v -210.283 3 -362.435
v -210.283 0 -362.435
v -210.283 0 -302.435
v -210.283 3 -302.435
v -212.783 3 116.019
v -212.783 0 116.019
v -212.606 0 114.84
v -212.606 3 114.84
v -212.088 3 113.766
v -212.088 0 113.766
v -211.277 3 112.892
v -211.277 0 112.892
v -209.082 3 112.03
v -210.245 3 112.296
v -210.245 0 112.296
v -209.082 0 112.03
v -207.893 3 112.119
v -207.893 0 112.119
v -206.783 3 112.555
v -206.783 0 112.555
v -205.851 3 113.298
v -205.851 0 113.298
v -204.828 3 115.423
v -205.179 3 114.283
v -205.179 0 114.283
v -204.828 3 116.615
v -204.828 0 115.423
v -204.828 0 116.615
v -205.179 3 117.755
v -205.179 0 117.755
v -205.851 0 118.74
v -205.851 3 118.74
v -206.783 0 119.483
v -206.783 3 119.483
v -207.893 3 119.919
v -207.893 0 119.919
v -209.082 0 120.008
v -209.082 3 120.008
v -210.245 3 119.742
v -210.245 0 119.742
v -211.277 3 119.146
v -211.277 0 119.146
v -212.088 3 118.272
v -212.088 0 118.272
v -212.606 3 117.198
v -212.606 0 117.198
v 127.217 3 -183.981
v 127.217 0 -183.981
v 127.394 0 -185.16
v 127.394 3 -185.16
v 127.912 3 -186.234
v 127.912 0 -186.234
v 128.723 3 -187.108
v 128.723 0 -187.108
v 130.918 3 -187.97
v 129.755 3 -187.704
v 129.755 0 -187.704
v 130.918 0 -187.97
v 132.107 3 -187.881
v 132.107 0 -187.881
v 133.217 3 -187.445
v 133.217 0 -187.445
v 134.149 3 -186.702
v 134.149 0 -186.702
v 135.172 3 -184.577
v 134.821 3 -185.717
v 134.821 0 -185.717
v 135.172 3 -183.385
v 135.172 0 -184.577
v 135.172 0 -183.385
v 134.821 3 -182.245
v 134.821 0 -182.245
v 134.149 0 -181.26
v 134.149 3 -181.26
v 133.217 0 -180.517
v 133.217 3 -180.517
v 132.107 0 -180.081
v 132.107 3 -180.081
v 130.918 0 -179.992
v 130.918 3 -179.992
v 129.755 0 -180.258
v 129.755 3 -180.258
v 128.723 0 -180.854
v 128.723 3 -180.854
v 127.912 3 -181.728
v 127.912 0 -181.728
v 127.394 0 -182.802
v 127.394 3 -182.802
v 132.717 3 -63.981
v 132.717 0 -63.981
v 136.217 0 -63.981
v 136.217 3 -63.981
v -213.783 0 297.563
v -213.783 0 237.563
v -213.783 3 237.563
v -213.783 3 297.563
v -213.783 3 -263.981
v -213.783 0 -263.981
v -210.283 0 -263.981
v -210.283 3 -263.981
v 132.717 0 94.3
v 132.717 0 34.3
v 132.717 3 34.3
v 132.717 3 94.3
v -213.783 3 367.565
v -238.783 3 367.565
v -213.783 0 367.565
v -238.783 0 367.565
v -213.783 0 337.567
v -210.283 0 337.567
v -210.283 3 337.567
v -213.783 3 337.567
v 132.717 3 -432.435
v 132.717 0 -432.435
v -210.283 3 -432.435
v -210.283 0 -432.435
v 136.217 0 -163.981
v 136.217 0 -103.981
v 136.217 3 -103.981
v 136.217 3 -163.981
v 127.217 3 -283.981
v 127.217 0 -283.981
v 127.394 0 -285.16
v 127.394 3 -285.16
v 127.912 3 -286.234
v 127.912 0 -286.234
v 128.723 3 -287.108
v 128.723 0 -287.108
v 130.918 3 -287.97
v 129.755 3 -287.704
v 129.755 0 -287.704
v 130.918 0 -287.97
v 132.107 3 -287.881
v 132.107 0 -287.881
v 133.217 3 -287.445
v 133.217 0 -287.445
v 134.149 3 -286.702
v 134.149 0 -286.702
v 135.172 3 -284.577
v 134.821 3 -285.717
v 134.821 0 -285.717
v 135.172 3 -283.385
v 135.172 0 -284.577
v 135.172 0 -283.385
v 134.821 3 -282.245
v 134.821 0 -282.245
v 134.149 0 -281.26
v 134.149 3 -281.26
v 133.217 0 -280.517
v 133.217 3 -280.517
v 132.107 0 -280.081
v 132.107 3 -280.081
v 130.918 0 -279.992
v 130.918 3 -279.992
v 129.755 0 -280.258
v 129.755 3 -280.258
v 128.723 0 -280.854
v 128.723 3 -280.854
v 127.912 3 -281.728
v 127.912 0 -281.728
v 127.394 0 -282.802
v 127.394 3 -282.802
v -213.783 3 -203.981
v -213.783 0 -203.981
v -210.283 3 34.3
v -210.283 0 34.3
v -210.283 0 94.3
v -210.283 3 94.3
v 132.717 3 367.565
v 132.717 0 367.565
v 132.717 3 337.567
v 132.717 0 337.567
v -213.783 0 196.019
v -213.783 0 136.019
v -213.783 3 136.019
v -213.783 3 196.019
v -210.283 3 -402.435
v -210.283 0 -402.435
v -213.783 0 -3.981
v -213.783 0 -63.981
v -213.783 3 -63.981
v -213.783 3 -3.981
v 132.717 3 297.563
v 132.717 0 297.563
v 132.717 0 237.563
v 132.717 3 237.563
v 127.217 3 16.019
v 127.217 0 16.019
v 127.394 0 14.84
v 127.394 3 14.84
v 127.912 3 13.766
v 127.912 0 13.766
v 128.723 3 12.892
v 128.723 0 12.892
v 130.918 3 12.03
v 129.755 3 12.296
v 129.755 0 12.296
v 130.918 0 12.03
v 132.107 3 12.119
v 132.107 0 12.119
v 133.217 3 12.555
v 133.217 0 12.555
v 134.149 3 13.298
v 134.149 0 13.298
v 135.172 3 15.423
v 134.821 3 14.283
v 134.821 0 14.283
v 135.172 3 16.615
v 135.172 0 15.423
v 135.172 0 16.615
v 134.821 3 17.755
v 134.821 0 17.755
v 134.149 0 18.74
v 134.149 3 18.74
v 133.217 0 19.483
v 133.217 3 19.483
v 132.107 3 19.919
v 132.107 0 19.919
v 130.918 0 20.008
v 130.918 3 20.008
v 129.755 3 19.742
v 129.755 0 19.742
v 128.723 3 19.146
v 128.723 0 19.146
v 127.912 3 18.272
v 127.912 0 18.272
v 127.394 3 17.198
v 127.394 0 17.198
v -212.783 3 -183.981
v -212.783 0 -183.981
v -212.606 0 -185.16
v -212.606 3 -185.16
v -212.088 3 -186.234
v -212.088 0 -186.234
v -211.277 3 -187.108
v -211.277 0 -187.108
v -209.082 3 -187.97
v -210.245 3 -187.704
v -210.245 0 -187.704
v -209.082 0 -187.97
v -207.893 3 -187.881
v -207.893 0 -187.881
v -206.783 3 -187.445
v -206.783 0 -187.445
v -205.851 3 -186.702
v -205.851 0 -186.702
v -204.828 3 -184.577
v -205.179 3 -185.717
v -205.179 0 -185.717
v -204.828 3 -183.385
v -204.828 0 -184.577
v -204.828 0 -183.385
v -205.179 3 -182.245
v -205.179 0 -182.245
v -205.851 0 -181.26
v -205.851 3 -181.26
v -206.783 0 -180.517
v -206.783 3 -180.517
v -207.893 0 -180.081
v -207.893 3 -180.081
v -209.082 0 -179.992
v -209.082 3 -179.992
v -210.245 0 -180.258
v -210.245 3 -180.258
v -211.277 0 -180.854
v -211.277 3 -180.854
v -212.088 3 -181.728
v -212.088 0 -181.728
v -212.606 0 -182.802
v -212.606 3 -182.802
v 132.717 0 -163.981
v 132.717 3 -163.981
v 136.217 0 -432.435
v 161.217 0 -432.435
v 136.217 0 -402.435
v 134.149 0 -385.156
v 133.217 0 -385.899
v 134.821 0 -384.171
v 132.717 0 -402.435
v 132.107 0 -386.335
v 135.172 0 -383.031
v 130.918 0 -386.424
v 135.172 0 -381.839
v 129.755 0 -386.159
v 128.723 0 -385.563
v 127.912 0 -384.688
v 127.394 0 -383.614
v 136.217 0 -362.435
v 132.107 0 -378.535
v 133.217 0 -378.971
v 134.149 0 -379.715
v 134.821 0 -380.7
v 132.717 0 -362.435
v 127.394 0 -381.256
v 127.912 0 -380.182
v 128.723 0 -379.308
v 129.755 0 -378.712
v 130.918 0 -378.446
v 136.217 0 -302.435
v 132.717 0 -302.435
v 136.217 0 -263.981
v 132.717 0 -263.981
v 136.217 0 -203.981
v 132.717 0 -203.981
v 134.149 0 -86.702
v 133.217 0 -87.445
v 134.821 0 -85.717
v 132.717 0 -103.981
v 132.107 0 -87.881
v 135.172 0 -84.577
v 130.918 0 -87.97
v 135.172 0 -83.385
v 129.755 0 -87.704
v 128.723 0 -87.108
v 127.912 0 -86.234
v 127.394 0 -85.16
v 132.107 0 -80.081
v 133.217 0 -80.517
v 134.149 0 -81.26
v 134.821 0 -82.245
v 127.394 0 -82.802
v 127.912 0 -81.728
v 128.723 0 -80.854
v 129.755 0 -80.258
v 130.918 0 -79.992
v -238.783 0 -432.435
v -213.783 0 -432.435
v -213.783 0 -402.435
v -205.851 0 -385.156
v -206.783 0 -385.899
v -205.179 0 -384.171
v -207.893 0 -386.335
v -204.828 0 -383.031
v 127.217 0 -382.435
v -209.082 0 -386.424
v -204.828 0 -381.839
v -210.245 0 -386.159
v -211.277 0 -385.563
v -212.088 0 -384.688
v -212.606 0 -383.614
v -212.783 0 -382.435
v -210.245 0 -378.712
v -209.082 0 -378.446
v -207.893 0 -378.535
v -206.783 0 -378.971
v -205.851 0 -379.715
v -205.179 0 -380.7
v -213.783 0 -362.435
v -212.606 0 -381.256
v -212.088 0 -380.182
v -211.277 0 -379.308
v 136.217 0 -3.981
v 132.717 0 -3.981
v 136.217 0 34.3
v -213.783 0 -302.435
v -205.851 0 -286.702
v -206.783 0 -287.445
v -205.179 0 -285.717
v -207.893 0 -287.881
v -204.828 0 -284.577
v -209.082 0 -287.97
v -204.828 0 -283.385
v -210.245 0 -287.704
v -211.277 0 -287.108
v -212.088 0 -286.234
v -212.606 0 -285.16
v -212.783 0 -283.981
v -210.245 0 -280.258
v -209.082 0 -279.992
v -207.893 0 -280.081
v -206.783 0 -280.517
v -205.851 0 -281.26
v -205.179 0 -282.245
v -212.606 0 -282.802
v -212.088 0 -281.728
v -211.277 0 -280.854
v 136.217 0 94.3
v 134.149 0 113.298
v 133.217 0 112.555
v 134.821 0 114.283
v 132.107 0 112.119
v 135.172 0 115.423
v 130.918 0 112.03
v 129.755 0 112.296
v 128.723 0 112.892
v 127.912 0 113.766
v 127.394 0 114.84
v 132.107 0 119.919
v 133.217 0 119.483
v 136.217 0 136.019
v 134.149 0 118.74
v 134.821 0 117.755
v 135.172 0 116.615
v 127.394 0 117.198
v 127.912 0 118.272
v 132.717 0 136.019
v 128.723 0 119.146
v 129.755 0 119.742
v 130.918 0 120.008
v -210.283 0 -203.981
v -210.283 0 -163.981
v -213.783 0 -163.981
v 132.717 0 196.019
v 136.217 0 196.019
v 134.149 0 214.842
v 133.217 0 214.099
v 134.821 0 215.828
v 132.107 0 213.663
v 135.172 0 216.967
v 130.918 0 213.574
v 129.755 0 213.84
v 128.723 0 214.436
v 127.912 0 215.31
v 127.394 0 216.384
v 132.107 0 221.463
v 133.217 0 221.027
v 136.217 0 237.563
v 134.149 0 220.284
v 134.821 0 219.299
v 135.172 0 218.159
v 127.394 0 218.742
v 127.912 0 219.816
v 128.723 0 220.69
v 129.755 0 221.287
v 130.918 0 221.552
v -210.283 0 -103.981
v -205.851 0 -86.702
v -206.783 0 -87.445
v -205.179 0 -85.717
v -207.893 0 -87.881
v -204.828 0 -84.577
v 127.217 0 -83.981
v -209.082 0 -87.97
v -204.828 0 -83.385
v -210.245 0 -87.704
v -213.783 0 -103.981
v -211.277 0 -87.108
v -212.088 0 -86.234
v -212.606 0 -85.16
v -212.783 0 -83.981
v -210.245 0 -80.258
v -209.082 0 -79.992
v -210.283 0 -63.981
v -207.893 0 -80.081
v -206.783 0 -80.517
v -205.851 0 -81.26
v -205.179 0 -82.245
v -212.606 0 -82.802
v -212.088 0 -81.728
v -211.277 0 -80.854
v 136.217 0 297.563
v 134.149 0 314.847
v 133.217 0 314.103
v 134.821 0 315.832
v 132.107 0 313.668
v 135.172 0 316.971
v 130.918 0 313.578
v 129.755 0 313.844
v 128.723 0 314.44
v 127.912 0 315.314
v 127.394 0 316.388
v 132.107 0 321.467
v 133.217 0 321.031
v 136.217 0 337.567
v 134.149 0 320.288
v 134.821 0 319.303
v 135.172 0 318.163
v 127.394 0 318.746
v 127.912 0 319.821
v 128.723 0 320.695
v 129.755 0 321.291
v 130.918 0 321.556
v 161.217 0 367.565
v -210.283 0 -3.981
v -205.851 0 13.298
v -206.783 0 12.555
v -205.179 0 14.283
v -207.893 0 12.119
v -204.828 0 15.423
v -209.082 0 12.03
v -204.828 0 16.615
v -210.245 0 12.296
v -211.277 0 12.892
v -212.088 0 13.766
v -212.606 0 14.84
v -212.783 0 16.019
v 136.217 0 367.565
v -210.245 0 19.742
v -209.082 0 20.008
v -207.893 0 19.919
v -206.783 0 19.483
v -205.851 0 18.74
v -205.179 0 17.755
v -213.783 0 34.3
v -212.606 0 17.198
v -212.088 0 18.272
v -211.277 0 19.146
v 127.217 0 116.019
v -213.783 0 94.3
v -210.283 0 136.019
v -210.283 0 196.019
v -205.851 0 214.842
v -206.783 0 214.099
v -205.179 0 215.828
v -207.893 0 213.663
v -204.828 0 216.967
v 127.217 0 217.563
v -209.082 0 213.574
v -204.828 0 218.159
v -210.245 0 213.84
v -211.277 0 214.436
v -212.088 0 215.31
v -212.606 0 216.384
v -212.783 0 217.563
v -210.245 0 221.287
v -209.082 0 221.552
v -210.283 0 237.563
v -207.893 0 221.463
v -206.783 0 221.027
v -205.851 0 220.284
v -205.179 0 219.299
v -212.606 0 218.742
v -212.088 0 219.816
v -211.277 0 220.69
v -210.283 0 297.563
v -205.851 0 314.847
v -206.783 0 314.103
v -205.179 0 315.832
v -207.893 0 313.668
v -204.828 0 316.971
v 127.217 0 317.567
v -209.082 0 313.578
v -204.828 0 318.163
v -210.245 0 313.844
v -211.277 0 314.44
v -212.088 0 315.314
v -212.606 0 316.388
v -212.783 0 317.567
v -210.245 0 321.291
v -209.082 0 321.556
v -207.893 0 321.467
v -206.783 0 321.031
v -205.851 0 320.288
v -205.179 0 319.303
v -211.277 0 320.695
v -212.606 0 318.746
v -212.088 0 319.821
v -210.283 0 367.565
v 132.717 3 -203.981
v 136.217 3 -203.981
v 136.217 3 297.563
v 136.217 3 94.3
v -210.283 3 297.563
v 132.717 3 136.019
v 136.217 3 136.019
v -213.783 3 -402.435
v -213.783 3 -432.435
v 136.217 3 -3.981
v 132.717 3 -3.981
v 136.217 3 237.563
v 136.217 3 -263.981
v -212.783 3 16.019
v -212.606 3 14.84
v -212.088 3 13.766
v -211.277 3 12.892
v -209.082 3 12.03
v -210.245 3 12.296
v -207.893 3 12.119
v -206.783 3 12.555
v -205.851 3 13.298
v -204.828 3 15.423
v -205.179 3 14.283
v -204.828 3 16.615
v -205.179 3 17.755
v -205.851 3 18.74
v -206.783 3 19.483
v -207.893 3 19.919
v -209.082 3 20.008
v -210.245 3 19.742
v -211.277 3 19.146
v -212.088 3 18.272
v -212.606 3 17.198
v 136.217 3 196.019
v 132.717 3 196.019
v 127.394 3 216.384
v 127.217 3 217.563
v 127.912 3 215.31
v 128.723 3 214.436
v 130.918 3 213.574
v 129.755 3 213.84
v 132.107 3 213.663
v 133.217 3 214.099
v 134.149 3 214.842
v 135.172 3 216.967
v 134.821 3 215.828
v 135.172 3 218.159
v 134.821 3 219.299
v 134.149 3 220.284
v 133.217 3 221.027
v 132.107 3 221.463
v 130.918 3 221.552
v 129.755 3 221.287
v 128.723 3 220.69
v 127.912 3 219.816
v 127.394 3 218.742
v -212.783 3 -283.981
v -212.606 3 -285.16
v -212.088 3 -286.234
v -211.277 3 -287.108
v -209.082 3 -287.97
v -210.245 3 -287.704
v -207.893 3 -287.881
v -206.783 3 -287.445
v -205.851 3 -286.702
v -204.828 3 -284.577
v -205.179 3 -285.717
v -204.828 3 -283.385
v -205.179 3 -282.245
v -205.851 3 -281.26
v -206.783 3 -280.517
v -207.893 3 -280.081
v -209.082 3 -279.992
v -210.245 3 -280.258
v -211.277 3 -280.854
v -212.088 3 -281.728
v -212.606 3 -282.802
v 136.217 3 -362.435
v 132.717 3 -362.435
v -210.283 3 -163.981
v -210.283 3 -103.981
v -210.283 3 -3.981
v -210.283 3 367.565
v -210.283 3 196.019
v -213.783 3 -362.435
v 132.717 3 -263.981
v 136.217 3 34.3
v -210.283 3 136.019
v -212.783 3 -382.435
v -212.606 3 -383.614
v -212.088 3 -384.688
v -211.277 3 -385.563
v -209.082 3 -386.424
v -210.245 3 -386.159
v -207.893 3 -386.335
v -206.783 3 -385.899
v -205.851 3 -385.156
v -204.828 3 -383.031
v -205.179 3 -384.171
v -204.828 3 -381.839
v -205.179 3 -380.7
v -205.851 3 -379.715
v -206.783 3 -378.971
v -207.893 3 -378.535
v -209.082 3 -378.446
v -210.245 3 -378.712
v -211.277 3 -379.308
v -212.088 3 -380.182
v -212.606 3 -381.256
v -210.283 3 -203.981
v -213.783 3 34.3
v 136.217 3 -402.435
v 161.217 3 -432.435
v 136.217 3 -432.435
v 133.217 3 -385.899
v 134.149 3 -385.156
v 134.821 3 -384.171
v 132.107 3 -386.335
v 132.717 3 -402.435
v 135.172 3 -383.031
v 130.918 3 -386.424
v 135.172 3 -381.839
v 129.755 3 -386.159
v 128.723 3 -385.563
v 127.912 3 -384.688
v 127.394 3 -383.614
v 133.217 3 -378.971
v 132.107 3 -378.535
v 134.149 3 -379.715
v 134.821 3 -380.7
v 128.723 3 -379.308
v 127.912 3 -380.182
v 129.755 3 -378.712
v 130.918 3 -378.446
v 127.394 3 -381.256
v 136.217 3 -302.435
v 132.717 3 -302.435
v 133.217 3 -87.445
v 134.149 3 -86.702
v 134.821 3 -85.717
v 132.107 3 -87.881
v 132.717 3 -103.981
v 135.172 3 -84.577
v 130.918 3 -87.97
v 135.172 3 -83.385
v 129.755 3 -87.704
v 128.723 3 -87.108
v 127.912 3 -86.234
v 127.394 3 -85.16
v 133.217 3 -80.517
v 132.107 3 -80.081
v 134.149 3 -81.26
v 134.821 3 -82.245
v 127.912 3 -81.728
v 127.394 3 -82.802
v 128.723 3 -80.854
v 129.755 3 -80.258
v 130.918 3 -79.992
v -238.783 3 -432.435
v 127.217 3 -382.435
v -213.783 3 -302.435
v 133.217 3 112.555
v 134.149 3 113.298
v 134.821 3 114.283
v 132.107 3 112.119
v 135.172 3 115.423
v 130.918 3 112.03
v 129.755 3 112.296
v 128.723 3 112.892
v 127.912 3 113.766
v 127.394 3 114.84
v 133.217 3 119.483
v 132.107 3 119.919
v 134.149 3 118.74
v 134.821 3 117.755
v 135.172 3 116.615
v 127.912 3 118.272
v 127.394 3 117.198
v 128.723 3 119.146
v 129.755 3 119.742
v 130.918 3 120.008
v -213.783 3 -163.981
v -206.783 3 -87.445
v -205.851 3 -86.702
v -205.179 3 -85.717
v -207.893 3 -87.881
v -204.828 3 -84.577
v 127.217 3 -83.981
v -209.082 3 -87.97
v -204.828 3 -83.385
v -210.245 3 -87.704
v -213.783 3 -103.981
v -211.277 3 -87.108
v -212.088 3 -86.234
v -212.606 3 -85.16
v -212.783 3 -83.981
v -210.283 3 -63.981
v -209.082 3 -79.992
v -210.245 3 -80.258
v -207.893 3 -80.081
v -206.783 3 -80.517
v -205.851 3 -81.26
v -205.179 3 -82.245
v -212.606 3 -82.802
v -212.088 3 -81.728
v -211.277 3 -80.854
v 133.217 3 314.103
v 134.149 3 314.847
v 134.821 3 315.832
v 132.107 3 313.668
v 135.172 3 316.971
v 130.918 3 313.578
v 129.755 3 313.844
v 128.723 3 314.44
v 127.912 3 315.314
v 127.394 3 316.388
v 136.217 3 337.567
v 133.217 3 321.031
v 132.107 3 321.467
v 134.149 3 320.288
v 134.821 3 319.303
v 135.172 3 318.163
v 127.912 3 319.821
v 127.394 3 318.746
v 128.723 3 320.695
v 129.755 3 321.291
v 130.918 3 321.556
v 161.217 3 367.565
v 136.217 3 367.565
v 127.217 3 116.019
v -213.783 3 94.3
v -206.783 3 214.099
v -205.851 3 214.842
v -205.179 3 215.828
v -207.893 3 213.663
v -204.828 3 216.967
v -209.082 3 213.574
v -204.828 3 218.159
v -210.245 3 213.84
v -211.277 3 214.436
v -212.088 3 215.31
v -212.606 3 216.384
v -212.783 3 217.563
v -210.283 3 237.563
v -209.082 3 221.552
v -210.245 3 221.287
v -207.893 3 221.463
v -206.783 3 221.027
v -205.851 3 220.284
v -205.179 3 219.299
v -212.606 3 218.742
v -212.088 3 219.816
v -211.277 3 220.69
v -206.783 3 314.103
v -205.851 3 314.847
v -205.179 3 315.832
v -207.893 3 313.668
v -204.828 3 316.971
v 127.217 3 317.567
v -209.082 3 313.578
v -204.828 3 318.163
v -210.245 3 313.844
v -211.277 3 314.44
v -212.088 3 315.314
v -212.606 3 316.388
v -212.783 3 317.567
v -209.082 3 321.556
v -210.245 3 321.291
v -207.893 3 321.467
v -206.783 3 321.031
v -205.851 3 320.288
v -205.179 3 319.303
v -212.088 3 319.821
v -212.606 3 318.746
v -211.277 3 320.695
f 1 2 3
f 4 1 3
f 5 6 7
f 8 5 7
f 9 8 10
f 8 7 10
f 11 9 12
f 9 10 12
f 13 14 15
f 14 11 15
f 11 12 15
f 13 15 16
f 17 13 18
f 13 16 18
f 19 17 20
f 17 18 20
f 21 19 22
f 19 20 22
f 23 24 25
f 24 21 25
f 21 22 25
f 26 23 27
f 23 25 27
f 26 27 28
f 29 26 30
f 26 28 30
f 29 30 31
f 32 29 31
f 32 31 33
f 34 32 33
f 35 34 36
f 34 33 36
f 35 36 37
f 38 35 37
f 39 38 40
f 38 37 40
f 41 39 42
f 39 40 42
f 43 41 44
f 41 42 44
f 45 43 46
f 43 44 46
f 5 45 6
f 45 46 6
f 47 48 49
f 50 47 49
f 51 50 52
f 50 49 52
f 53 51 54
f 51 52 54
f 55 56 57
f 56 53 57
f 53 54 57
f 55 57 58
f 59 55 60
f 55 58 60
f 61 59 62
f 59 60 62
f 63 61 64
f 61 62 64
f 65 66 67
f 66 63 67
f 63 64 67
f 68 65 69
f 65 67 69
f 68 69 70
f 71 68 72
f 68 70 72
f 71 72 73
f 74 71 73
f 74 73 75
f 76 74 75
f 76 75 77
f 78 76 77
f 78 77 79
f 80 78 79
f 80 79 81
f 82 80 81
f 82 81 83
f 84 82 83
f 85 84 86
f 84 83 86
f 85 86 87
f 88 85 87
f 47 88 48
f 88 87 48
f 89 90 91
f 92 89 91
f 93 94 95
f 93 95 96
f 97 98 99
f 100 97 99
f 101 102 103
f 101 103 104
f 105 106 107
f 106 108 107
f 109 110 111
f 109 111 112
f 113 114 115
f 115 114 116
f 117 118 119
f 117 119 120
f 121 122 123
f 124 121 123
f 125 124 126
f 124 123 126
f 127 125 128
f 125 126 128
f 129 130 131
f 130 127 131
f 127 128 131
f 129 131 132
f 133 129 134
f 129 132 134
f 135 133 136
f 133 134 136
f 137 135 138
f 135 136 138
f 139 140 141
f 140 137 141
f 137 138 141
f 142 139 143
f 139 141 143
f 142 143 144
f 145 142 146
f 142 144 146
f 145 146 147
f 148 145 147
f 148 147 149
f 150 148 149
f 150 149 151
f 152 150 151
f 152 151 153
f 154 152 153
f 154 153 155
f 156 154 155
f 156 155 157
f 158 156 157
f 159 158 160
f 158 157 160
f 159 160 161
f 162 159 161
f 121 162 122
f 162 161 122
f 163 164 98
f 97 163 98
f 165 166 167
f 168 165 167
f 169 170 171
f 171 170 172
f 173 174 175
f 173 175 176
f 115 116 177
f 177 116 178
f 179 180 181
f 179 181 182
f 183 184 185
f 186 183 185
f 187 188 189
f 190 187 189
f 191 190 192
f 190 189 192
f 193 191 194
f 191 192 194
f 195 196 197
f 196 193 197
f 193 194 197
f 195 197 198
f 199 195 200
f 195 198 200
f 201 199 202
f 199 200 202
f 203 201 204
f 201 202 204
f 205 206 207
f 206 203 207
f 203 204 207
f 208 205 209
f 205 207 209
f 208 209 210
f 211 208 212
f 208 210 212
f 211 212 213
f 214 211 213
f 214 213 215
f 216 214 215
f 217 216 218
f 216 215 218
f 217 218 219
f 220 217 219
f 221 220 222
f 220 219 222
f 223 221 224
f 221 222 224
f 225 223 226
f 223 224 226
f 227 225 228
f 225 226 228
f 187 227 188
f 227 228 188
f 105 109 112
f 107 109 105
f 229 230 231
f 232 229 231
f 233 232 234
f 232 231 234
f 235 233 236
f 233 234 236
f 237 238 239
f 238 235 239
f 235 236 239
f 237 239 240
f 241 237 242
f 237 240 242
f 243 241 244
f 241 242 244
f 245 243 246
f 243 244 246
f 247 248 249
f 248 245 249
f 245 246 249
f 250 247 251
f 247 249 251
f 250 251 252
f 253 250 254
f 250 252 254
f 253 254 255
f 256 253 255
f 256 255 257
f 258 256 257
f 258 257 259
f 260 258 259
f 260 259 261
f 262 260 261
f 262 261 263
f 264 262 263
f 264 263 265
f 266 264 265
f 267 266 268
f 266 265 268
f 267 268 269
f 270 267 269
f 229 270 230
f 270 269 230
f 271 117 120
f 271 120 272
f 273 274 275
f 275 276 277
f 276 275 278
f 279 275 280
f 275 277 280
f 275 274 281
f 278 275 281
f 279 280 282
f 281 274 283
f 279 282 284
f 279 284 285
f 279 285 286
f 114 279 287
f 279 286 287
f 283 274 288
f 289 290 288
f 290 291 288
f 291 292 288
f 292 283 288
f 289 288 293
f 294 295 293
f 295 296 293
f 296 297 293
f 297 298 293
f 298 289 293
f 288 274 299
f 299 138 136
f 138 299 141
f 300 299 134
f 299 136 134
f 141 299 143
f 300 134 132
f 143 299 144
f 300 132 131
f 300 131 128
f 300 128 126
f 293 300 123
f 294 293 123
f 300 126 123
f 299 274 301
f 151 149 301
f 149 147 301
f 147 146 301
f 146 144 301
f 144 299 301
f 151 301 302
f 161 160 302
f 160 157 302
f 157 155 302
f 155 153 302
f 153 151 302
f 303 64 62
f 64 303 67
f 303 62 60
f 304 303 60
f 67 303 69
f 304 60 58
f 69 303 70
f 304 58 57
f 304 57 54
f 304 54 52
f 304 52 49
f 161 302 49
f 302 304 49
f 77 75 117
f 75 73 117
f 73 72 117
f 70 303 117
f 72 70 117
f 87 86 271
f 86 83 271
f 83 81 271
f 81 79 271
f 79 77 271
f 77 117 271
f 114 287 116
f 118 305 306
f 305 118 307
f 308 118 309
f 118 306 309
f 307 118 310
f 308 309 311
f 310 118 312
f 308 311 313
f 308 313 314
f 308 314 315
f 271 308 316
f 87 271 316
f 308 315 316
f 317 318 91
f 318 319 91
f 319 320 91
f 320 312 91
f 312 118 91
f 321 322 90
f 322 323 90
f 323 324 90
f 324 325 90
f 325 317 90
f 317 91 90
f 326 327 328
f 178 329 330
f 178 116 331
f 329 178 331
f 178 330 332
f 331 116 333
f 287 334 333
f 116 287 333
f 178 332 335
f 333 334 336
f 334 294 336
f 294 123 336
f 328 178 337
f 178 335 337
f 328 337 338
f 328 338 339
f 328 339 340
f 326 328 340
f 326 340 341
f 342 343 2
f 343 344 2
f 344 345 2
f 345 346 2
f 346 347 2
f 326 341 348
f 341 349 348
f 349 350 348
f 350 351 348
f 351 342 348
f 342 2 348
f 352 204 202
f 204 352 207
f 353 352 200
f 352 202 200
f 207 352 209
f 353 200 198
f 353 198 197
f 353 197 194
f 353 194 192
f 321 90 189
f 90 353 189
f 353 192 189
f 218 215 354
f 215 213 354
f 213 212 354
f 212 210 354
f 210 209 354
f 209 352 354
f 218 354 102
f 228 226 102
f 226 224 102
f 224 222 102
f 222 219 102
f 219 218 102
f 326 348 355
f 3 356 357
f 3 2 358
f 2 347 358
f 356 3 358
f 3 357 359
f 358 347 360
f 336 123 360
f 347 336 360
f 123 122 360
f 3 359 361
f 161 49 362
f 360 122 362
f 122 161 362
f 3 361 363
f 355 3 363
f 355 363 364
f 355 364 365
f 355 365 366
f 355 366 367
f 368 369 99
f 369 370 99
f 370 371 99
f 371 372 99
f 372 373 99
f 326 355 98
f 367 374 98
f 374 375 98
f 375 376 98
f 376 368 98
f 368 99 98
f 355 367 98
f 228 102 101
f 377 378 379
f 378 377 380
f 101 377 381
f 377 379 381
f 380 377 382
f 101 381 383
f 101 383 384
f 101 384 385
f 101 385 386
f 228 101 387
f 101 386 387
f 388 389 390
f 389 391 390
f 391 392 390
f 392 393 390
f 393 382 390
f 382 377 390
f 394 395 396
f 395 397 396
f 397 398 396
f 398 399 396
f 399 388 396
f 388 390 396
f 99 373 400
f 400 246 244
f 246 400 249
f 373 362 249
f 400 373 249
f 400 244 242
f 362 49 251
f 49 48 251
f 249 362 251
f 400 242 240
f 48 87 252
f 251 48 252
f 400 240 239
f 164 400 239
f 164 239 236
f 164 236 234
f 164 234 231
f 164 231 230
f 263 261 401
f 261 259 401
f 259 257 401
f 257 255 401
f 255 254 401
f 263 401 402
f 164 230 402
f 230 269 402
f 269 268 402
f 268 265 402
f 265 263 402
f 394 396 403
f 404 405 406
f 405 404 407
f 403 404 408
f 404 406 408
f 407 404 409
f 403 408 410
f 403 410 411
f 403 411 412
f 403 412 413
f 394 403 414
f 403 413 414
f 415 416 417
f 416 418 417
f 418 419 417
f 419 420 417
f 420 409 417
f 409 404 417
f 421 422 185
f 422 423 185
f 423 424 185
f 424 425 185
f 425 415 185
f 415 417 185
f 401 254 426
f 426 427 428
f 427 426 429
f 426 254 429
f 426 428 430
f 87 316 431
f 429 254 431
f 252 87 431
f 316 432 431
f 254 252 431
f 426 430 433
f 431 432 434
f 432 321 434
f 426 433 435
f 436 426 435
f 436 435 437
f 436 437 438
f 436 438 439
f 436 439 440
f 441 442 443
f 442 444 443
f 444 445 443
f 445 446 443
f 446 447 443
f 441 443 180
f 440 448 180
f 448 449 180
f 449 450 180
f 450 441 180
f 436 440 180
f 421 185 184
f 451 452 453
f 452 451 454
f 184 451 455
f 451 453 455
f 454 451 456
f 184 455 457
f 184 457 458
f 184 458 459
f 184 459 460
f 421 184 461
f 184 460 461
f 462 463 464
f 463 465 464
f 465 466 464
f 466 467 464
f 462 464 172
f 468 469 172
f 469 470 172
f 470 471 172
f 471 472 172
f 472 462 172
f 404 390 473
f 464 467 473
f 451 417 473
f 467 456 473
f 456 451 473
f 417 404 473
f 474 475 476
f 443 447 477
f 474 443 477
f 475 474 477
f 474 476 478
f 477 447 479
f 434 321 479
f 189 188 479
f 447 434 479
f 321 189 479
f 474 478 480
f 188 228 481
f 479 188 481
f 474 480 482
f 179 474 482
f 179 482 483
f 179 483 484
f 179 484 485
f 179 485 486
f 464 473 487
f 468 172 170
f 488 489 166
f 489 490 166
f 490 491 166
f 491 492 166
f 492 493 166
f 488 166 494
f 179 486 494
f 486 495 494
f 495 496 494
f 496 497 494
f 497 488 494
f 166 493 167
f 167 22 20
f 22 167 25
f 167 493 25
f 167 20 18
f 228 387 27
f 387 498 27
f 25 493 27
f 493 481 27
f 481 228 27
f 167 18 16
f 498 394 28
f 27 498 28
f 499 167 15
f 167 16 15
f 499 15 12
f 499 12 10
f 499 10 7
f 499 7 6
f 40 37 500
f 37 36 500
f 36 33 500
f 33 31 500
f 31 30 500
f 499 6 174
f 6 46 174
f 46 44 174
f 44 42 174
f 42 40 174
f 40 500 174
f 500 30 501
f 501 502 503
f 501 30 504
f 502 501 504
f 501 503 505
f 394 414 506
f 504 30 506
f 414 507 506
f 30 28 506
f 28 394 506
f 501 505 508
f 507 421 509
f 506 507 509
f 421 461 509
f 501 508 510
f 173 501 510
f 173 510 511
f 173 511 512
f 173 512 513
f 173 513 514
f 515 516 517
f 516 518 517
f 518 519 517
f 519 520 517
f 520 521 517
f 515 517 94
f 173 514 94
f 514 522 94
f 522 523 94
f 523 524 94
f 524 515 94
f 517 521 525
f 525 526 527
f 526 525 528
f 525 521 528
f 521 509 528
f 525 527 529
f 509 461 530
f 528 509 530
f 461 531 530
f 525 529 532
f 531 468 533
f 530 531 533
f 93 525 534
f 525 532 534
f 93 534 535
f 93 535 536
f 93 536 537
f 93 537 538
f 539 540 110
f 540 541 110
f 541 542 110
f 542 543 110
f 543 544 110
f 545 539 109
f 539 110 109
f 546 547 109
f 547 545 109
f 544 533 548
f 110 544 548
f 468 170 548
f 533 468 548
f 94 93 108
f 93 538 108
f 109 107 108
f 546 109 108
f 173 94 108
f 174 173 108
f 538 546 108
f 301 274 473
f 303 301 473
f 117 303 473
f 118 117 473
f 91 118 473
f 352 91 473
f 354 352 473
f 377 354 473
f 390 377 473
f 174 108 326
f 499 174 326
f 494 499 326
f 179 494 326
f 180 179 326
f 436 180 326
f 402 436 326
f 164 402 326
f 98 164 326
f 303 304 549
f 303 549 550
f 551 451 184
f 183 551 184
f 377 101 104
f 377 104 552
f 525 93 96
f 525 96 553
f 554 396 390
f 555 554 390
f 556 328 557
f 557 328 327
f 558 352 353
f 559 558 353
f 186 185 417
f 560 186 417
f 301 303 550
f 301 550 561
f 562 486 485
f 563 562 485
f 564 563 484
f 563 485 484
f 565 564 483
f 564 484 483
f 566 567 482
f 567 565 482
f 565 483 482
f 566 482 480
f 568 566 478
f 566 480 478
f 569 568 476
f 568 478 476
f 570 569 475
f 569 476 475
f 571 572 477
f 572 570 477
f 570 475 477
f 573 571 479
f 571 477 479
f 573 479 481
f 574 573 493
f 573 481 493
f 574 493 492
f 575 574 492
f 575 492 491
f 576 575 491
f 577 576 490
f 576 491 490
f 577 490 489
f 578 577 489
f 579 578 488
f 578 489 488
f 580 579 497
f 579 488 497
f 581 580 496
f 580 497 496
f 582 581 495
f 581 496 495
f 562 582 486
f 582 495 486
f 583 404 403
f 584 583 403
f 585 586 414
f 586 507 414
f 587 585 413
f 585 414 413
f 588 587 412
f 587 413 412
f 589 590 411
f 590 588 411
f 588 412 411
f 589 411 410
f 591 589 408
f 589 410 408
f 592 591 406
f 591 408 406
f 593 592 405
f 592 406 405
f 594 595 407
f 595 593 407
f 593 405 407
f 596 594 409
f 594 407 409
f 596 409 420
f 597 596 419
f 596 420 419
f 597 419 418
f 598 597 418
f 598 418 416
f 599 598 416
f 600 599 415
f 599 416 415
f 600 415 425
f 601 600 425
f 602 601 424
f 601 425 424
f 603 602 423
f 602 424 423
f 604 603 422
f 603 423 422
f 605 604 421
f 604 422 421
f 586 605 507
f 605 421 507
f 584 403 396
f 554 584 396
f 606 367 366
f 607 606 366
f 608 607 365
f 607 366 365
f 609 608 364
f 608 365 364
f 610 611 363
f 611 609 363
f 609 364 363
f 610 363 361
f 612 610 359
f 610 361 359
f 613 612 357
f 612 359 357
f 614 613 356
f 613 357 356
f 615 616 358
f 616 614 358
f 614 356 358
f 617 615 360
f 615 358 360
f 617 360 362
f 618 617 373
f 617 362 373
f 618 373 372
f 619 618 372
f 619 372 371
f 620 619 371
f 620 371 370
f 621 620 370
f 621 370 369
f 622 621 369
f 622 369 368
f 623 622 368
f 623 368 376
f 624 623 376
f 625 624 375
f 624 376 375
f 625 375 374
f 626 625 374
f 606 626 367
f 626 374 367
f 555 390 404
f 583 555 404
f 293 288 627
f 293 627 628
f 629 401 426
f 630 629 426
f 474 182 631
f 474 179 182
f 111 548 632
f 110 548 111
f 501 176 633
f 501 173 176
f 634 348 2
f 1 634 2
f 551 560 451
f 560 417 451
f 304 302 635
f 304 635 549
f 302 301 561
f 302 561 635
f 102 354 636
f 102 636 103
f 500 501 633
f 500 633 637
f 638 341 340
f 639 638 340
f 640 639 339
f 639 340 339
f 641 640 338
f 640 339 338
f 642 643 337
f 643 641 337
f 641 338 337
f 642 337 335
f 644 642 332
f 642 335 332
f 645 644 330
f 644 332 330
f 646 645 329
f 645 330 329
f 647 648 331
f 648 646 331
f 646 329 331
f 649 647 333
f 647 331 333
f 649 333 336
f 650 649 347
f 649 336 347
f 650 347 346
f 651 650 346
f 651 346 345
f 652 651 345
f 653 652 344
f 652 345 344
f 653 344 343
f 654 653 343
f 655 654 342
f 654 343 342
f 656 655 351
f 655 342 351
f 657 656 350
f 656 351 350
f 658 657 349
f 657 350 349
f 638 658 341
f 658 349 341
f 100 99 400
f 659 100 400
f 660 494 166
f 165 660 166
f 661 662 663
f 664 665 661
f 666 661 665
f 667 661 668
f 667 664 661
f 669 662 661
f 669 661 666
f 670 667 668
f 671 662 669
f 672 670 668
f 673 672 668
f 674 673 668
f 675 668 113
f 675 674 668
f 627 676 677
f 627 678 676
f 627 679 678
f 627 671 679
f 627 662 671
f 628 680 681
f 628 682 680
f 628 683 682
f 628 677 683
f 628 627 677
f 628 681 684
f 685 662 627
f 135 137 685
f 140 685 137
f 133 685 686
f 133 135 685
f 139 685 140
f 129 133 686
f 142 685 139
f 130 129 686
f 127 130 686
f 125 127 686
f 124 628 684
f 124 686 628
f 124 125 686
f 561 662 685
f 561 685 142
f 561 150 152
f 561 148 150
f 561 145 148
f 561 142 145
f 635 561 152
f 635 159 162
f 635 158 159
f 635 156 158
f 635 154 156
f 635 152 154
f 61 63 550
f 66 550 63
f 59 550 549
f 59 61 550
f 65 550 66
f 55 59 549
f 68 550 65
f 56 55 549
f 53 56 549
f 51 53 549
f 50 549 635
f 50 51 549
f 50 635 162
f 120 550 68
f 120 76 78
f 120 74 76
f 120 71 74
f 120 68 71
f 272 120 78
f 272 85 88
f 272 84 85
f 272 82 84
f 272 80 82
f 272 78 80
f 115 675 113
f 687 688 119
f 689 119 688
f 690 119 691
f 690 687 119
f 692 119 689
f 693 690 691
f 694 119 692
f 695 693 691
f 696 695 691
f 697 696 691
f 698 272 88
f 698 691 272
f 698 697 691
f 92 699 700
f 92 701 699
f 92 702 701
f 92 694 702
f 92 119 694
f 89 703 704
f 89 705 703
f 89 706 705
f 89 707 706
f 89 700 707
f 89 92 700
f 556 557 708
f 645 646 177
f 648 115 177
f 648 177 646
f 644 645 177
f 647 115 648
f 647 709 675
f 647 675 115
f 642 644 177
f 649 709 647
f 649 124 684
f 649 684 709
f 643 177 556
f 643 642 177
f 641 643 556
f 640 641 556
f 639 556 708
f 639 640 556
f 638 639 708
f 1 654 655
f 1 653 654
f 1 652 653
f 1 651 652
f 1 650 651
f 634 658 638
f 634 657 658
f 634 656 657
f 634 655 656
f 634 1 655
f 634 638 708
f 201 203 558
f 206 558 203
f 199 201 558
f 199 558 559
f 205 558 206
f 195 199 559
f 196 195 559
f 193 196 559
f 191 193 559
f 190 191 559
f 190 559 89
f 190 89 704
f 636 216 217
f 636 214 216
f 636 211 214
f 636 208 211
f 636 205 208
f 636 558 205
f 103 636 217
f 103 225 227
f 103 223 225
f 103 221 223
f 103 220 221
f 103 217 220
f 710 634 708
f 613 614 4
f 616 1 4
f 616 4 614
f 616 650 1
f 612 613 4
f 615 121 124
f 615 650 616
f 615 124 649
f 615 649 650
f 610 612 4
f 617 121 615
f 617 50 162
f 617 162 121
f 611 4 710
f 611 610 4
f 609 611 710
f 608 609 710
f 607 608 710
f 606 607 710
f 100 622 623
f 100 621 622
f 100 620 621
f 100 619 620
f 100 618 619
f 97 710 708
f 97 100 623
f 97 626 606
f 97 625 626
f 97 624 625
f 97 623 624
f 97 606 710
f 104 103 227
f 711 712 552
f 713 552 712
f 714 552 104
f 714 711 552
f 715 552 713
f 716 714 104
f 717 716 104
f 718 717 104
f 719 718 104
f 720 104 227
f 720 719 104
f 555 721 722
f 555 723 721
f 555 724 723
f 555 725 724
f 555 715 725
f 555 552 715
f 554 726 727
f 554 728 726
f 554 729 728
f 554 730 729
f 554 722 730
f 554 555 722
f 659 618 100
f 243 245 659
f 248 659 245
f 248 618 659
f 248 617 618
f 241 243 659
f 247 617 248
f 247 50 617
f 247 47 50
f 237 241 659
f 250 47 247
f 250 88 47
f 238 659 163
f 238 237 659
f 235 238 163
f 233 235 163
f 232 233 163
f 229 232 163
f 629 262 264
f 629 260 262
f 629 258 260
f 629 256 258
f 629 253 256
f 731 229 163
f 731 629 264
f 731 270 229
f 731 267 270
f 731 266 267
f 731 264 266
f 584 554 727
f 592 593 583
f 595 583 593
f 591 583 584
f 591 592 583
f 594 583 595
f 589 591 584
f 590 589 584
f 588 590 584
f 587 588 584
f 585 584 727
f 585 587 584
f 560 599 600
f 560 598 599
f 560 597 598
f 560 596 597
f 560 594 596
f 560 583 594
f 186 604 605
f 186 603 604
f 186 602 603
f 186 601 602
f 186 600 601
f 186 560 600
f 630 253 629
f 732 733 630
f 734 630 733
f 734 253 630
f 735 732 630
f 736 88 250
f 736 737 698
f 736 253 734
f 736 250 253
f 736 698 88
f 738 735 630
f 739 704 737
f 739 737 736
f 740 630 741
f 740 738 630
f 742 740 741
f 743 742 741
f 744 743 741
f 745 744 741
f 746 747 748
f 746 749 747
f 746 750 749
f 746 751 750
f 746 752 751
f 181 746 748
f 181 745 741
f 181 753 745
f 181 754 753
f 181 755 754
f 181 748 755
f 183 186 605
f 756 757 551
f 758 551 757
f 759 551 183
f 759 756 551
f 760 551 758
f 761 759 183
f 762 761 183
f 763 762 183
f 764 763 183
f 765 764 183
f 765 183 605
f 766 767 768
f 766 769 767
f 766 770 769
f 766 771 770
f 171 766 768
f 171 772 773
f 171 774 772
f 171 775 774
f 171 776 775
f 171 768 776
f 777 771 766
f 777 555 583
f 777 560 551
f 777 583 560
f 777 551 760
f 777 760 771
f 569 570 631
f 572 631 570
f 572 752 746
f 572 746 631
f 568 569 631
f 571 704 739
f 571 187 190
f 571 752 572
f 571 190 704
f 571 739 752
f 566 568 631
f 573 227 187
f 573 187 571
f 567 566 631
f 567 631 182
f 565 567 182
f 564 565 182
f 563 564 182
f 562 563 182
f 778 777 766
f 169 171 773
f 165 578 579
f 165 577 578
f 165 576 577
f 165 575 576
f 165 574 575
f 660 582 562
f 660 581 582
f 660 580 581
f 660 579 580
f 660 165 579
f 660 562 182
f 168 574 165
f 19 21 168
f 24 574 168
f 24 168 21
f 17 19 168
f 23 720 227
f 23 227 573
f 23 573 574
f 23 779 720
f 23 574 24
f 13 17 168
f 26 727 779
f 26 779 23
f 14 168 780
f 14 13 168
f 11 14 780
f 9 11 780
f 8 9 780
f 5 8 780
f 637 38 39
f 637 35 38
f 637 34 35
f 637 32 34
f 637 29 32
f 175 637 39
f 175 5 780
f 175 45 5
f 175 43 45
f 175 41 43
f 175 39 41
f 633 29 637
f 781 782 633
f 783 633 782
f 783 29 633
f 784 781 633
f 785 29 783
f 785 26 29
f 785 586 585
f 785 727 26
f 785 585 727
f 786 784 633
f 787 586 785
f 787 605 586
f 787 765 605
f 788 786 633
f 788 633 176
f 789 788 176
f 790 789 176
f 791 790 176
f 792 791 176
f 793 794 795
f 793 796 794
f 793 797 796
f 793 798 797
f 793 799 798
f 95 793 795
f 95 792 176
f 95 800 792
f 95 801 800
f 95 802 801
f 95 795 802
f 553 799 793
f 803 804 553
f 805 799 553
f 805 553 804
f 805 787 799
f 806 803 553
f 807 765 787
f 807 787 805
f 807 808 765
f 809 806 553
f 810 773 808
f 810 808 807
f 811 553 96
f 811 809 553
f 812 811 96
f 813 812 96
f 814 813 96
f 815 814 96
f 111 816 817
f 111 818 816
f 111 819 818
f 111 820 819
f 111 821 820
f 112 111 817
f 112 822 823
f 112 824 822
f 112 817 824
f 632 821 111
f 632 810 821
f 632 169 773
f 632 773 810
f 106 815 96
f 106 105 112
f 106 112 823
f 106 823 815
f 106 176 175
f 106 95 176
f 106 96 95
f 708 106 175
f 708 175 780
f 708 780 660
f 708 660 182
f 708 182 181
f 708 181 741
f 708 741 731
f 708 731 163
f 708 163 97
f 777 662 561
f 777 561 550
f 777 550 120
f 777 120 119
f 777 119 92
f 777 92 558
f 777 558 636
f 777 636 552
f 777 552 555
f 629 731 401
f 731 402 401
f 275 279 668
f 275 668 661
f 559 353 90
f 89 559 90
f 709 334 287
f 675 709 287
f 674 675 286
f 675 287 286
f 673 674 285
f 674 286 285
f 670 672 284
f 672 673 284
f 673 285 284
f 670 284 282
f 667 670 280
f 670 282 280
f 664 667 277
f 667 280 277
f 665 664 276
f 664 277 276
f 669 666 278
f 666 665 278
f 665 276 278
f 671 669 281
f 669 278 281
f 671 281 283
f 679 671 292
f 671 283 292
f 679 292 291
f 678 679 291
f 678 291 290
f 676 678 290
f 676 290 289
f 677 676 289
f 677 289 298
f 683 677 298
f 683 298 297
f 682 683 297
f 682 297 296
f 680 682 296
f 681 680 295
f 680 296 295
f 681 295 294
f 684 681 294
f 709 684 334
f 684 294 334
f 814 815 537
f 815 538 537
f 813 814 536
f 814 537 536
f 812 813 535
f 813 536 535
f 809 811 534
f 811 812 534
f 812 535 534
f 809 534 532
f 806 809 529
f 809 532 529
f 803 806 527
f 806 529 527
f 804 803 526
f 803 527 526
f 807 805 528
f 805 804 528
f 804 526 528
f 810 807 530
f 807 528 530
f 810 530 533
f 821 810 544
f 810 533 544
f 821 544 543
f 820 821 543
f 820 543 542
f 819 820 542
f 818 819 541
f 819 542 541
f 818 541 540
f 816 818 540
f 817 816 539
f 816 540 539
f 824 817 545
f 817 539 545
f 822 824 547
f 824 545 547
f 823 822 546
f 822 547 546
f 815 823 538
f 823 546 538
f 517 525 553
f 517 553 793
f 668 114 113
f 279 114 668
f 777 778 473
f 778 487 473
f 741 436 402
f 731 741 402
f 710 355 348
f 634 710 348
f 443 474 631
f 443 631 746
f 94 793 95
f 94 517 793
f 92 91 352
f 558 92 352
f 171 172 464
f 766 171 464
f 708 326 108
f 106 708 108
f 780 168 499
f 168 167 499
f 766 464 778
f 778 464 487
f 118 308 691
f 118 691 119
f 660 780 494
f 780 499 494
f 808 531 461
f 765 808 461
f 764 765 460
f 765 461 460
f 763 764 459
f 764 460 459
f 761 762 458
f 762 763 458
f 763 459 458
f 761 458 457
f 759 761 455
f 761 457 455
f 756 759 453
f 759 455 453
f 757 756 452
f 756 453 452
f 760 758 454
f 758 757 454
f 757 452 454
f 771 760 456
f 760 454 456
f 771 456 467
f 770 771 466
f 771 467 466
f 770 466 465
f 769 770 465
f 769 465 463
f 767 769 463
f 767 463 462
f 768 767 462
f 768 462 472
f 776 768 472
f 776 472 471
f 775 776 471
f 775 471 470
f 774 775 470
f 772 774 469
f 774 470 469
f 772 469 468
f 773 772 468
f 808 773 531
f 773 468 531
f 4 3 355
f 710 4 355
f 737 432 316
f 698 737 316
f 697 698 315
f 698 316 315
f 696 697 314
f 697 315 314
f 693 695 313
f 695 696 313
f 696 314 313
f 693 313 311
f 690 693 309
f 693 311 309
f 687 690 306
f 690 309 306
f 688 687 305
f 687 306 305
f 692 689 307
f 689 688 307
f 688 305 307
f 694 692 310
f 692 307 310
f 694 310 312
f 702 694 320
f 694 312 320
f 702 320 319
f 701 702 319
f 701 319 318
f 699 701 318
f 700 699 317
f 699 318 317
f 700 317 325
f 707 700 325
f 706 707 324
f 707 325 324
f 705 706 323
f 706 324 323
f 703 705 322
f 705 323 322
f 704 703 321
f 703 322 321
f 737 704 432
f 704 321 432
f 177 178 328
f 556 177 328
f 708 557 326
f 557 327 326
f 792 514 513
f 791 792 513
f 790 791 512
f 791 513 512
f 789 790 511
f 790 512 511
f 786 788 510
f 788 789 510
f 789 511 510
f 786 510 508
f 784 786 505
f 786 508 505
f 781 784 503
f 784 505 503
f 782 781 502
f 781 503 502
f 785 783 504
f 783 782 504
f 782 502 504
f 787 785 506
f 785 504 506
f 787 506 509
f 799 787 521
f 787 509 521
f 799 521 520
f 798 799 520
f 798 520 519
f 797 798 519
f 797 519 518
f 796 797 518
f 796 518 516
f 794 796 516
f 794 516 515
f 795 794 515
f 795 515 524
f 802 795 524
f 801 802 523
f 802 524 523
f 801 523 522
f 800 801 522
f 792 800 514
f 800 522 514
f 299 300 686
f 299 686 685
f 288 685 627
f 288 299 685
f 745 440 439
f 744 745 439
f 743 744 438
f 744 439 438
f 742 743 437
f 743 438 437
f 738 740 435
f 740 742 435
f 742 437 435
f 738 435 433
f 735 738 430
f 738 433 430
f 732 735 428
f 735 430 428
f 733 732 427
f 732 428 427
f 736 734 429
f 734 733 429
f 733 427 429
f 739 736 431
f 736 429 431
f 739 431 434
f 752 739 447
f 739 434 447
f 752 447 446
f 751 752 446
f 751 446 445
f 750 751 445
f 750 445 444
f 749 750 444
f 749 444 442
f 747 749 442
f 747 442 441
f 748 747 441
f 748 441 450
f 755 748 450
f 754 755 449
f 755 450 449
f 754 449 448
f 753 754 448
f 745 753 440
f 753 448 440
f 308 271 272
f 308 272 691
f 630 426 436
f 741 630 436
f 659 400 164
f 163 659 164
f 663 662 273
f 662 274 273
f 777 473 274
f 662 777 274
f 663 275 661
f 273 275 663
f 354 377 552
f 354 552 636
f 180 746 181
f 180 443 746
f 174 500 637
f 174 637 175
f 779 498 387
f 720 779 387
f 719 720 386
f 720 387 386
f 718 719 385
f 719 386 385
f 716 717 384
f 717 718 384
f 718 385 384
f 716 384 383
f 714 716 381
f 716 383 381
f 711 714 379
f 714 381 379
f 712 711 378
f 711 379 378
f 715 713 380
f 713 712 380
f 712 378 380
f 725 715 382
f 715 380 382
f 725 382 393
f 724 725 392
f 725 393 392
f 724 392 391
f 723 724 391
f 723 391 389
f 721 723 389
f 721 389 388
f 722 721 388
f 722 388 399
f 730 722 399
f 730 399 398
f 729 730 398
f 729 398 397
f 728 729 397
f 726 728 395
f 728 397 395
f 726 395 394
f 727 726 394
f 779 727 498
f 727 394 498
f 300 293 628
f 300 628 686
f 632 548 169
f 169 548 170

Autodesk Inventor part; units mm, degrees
ref_plane "YZ Plane" through (0, 0, 0) normal (1, 0, 0) x (0, 1, 0)
ref_plane "XZ Plane" through (0, 0, 0) normal (0, 1, 0) x (-1, 0, 0)
ref_plane "XY Plane" through (0, 0, 0) normal (0, 0, 1) x (1, 0, 0)
sketch "Sketch2" plane through (0, 0, 0) normal (0, 1, 0) x (-1, 0, 0)
  line L0 (238.7833, 367.5648) -> (-161.2167, 367.5648)
  line L1 (-161.2167, 367.5648) -> (-161.2167, -432.4352)
  line L2 (-161.2167, -432.4352) -> (238.7833, -432.4352)
  line L3 (238.7833, -432.4352) -> (238.7833, 367.5648)
  circle A0 centre (208.7833, 217.5631) radius 4
  circle A1 centre (208.7833, 317.5673) radius 4
  circle A2 centre (208.7833, -382.4352) radius 4
  circle A3 centre (208.7833, -283.981) radius 4
  circle A4 centre (208.7833, -183.981) radius 4
  circle A5 centre (208.7833, -83.981) radius 4
  circle A6 centre (208.7833, 16.019) radius 4
  circle A7 centre (208.7833, 116.019) radius 4
  line L4 (38.7833, -432.4352) -> (38.7833, 367.5648) construction
  line L5 (208.7833, 217.5631) -> (208.7833, 317.5673) construction
  line L6 (208.7833, 317.5673) -> (208.7833, 367.5648) construction
  line L7 (208.7833, -382.4352) -> (208.7833, -432.4352) construction
  line L8 (208.7833, -382.4352) -> (208.7833, 217.5631) construction
  line L9 (213.7833, -263.981) -> (210.2833, -263.981)
  line L10 (210.2833, -263.981) -> (210.2833, -203.981)
  line L11 (210.2833, -203.981) -> (213.7833, -203.981)
  line L12 (213.7833, -203.981) -> (213.7833, -263.981)
  line L13 (213.7833, 196.019) -> (210.2833, 196.019)
  line L14 (210.2833, 196.019) -> (210.2833, 136.019)
  line L15 (210.2833, 136.019) -> (213.7833, 136.019)
  line L16 (213.7833, 136.019) -> (213.7833, 196.019)
  line L17 (213.7833, -3.981) -> (210.2833, -3.981)
  line L18 (210.2833, -3.981) -> (210.2833, -63.981)
  line L19 (210.2833, -63.981) -> (213.7833, -63.981)
  line L20 (213.7833, -63.981) -> (213.7833, -3.981)
  line L21 (213.7833, 34.2998) -> (210.2833, 34.2998)
  line L22 (210.2833, 34.2998) -> (210.2833, 94.2998)
  line L23 (210.2833, 94.2998) -> (213.7833, 94.2998)
  line L24 (213.7833, 94.2998) -> (213.7833, 34.2998)
  line L25 (213.7833, -163.981) -> (210.2833, -163.981)
  line L26 (210.2833, -163.981) -> (210.2833, -103.981)
  line L27 (210.2833, -103.981) -> (213.7833, -103.981)
  line L28 (213.7833, -103.981) -> (213.7833, -163.981)
  line L29 (213.7833, -362.4352) -> (210.2833, -362.4352)
  line L30 (210.2833, -362.4352) -> (210.2833, -302.4352)
  line L31 (210.2833, -302.4352) -> (213.7833, -302.4352)
  line L32 (213.7833, -302.4352) -> (213.7833, -362.4352)
  line L33 (210.2833, 237.5631) -> (213.7833, 237.5631)
  line L34 (213.7833, 237.5631) -> (213.7833, 297.5631)
  line L35 (213.7833, 297.5631) -> (210.2833, 297.5631)
  line L36 (210.2833, 297.5631) -> (210.2833, 237.5631)
  line L37 (210.2833, 337.5673) -> (213.7833, 337.5673)
  line L38 (213.7833, 337.5673) -> (213.7833, 367.5648)
  line L39 (213.7833, 367.5648) -> (210.2833, 367.5648)
  line L40 (210.2833, 367.5648) -> (210.2833, 337.5673)
  line L41 (213.7833, -432.4352) -> (210.2833, -432.4352)
  line L42 (210.2833, -432.4352) -> (210.2833, -402.4352)
  line L43 (210.2833, -402.4352) -> (213.7833, -402.4352)
  line L44 (213.7833, -402.4352) -> (213.7833, -432.4352)
  circle A8 centre (-131.2167, 217.5631) radius 4
  circle A9 centre (-131.2167, 317.5673) radius 4
  circle A10 centre (-131.2167, -382.4352) radius 4
  circle A11 centre (-131.2167, -283.981) radius 4
  circle A12 centre (-131.2167, -183.981) radius 4
  circle A13 centre (-131.2167, -83.981) radius 4
  circle A14 centre (-131.2167, 16.019) radius 4
  circle A15 centre (-131.2167, 116.019) radius 4
  line L45 (-131.2167, 217.5631) -> (-131.2167, 317.5673) construction
  line L46 (-131.2167, 317.5673) -> (-131.2167, 367.5648) construction
  line L47 (-131.2167, -382.4352) -> (-131.2167, -432.4352) construction
  line L48 (-131.2167, -382.4352) -> (-131.2167, 217.5631) construction
  line L49 (-136.2167, -263.981) -> (-132.7167, -263.981)
  line L50 (-132.7167, -263.981) -> (-132.7167, -203.981)
  line L51 (-132.7167, -203.981) -> (-136.2167, -203.981)
  line L52 (-136.2167, -203.981) -> (-136.2167, -263.981)
  line L53 (-136.2167, 196.019) -> (-132.7167, 196.019)
  line L54 (-132.7167, 196.019) -> (-132.7167, 136.019)
  line L55 (-132.7167, 136.019) -> (-136.2167, 136.019)
  line L56 (-136.2167, 136.019) -> (-136.2167, 196.019)
  line L57 (-136.2167, -3.981) -> (-132.7167, -3.981)
  line L58 (-132.7167, -3.981) -> (-132.7167, -63.981)
  line L59 (-132.7167, -63.981) -> (-136.2167, -63.981)
  line L60 (-136.2167, -63.981) -> (-136.2167, -3.981)
  line L61 (-136.2167, 34.2998) -> (-132.7167, 34.2998)
  line L62 (-132.7167, 34.2998) -> (-132.7167, 94.2998)
  line L63 (-132.7167, 94.2998) -> (-136.2167, 94.2998)
  line L64 (-136.2167, 94.2998) -> (-136.2167, 34.2998)
  line L65 (-136.2167, -163.981) -> (-132.7167, -163.981)
  line L66 (-132.7167, -163.981) -> (-132.7167, -103.981)
  line L67 (-132.7167, -103.981) -> (-136.2167, -103.981)
  line L68 (-136.2167, -103.981) -> (-136.2167, -163.981)
  line L69 (-136.2167, -362.4352) -> (-132.7167, -362.4352)
  line L70 (-132.7167, -362.4352) -> (-132.7167, -302.4352)
  line L71 (-132.7167, -302.4352) -> (-136.2167, -302.4352)
  line L72 (-136.2167, -302.4352) -> (-136.2167, -362.4352)
  line L73 (-132.7167, 237.5631) -> (-136.2167, 237.5631)
  line L74 (-136.2167, 237.5631) -> (-136.2167, 297.5631)
  line L75 (-136.2167, 297.5631) -> (-132.7167, 297.5631)
  line L76 (-132.7167, 297.5631) -> (-132.7167, 237.5631)
  line L77 (-132.7167, 337.5673) -> (-136.2167, 337.5673)
  line L78 (-136.2167, 337.5673) -> (-136.2167, 367.5648)
  line L79 (-132.7167, 367.5648) -> (-132.7167, 337.5673)
  line L80 (-132.7167, -432.4352) -> (-132.7167, -402.4352)
  line L81 (-132.7167, -402.4352) -> (-136.2167, -402.4352)
  line L82 (-136.2167, -402.4352) -> (-136.2167, -432.4352)
  point P0 (0, 0)
  dimension "d46" = 800
  dimension "d47" = 400
  dimension "d67" = 50
  dimension "d90" = 3.5
  dimension "d91" = 60
  dimension "d93" = 25
  dimension "d94" = 20
  dimension "d95" = 3.5
  dimension "d96" = 3.5
  dimension "d97" = 25
  dimension "d98" = 20
  dimension "d99" = 20
  dimension "d100" = 60
  dimension "d101" = 60
  dimension "d102" = 3.5
  dimension "d103" = 25
  dimension "d104" = 18.2808
  dimension "d105" = 60
  dimension "d106" = 25
  dimension "d107" = 3.5
  dimension "d108" = 20
  dimension "d109" = 60
  dimension "d110" = 3.5
  dimension "d111" = 60
  dimension "d112" = 20
  dimension "d113" = 25
  dimension "d114" = 3.5
  dimension "d115" = 25
  dimension "d116" = 20
  dimension "d117" = 60
  dimension "d118" = 3.5
  dimension "d119" = 25
  dimension "d120" = 20
  dimension "d121" = 3.5
  dimension "d123" = 25
  dimension "d124" = 20
extrude "Extrusion7" add sketch "Sketch2" along normal blind 3 contours L3 L2 L44 L43 L42 L80 L81 L82 L1 L0 L78 L77 L79 L40 L37 L38
properties part number "top_bottom_layer_3mm" material "Acrylic"
